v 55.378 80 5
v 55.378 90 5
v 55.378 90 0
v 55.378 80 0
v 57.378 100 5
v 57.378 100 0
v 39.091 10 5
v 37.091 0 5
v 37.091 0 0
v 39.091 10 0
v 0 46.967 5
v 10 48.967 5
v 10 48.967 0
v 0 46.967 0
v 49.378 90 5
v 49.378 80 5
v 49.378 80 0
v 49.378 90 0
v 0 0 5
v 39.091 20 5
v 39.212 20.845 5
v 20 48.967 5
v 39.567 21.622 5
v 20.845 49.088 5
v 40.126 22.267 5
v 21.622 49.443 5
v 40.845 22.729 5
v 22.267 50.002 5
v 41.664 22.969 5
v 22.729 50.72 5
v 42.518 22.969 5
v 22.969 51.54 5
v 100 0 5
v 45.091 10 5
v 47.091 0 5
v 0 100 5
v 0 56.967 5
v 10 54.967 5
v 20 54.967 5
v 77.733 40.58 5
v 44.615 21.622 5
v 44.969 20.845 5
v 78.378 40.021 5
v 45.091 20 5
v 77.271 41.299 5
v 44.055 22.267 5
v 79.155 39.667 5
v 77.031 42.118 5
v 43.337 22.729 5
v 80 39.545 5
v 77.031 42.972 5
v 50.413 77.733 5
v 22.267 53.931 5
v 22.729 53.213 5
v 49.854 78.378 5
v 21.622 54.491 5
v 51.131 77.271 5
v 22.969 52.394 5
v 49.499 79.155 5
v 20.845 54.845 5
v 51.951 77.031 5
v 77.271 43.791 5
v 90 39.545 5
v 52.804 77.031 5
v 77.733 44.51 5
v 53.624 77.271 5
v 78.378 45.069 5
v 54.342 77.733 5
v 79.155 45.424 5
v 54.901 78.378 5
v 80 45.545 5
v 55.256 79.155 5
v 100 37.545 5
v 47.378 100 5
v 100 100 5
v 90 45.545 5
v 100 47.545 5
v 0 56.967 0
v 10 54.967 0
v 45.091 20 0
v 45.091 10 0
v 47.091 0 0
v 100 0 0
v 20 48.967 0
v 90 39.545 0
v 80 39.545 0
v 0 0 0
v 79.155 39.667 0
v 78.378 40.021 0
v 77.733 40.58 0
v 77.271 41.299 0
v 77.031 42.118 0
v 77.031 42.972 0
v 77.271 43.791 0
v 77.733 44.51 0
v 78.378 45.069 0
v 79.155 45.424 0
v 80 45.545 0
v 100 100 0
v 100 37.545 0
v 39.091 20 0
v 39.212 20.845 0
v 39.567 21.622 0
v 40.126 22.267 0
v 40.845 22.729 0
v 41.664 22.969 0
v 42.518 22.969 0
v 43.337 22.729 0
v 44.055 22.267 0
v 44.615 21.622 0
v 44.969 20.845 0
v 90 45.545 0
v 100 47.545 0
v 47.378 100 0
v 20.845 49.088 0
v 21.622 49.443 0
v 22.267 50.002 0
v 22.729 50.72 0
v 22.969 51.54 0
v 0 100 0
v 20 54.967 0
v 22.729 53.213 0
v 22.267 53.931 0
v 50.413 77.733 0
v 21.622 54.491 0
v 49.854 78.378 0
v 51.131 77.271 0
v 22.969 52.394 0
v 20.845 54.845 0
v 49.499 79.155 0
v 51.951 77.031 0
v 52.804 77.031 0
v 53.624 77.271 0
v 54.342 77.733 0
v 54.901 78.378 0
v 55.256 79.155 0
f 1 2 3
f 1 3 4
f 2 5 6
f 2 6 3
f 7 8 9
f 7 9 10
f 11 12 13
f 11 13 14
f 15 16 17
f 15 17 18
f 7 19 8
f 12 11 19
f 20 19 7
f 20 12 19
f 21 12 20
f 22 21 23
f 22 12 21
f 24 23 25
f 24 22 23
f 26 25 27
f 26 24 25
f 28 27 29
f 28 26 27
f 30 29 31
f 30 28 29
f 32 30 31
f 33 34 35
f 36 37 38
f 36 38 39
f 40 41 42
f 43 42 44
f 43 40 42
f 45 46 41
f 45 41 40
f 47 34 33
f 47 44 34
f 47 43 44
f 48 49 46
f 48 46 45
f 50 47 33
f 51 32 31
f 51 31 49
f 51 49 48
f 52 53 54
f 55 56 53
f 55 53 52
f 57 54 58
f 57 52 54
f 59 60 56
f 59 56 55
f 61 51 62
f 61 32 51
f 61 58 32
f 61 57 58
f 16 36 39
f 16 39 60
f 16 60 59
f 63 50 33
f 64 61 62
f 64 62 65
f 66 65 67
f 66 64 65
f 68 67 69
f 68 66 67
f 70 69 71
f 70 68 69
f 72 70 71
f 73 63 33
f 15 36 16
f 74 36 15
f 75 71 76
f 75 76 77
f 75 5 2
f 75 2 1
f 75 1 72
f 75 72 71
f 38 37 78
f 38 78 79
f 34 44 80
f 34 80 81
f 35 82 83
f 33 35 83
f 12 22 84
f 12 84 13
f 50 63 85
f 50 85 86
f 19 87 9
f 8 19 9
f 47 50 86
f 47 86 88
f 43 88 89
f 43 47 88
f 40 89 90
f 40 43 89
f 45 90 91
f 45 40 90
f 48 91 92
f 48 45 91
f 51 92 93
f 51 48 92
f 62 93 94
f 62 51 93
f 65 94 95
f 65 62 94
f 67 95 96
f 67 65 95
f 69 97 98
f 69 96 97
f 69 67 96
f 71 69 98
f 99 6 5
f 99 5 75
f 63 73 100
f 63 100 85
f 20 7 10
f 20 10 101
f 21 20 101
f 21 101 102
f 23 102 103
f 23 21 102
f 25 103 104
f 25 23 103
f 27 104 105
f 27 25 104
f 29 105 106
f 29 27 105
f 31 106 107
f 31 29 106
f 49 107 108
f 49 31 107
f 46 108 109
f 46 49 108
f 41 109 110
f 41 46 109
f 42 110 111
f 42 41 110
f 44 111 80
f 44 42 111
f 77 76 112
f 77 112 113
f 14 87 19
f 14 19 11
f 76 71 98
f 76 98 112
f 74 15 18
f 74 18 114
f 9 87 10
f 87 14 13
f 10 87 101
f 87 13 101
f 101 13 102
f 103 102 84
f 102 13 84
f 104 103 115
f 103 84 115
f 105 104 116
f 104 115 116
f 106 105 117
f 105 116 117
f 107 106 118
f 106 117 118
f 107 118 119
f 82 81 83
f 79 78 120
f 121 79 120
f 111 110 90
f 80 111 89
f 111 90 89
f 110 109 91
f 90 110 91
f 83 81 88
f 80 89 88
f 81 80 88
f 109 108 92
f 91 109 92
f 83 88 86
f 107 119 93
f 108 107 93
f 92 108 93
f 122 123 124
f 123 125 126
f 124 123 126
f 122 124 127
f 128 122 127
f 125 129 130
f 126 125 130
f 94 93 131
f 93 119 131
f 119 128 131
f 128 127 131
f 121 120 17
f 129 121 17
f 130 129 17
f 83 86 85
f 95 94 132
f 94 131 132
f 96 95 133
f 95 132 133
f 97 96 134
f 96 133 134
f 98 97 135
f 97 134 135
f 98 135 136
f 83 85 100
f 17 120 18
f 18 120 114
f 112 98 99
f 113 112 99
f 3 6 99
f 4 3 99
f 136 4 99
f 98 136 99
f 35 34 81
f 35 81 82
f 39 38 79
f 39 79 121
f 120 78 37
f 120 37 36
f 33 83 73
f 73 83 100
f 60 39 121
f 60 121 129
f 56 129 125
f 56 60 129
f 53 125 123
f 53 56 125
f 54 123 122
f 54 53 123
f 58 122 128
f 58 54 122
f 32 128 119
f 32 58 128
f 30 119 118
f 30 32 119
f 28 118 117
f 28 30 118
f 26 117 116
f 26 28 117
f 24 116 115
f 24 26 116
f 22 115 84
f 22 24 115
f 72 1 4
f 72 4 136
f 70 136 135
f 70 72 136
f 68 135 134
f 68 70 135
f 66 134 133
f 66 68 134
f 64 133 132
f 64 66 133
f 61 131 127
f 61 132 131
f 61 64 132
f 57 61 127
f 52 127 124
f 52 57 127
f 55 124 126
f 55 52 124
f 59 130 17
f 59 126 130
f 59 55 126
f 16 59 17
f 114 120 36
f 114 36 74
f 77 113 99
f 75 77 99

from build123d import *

# Parameters (mm, degrees)
SKIZZE1_W                        = 100
SKIZZE1_H                        = 100
AUFSATZ_LINEAR_AUSTRAGEN1_DEPTH  = 5
SCHNITT_LINEAR_AUSTRAGEN1_REACH  = 7
SCHNITT_LINEAR_AUSTRAGEN14_REACH = 7
SCHNITT_LINEAR_AUSTRAGEN15_REACH = 7
SCHNITT_LINEAR_AUSTRAGEN16_REACH = 7


with BuildPart() as part:
    # Skizze1 → Aufsatz-Linear austragen1 (new body)
    with BuildSketch(Plane.XY):
        with Locations((50, 50)):
            Rectangle(SKIZZE1_W, SKIZZE1_H)
    extrude(amount=AUFSATZ_LINEAR_AUSTRAGEN1_DEPTH)

    # Skizze2 → Schnitt-Linear austragen1 (cut, up to next)
    with BuildSketch(Plane(origin=(61.541641428, 22.675716927, 5), x_dir=(1, 0, 0), z_dir=(0, 0, 1)), mode=Mode.PRIVATE) as schnitt_linear_austragen1_sk1:
        with BuildLine():
            Line((-24.45087326, -22.675716927), (-22.45087326, -12.675716927))
            Line((-22.45087326, -12.675716927), (-22.45087326, -2.675716927))
            ThreePointArc((-22.45087326, -2.675716927), (-19.45087326, 0.324283073), (-16.45087326, -2.675716927))
            Line((-16.45087326, -2.675716927), (-16.45087326, -12.675716927))
            Line((-16.45087326, -12.675716927), (-14.45087326, -22.675716927))
            Line((-14.45087326, -22.675716927), (-24.45087326, -22.675716927))
        make_face()
    schnitt_linear_austragen1_tool1 = extrude(schnitt_linear_austragen1_sk1.sketch, amount=-SCHNITT_LINEAR_AUSTRAGEN1_REACH, mode=Mode.PRIVATE) & part.part
    add(schnitt_linear_austragen1_tool1.solids().sort_by_distance((42.090768, 10.16893, 5))[0], mode=Mode.SUBTRACT)

    # Skizze24 → Schnitt-Linear austragen14 (cut, up to next)
    with BuildSketch(Plane(origin=(44.055881927, 74.466743066, 5), x_dir=(1, 0, 0), z_dir=(0, 0, 1)), mode=Mode.PRIVATE) as schnitt_linear_austragen14_sk1:
        with BuildLine():
            Line((-44.055881927, -17.5), (-34.055881927, -19.5))
            Line((-34.055881927, -19.5), (-24.055881927, -19.5))
            ThreePointArc((-24.055881927, -19.5), (-21.055881927, -22.5), (-24.055881927, -25.5))
            Line((-24.055881927, -25.5), (-34.055881927, -25.5))
            Line((-34.055881927, -25.5), (-44.055881927, -27.5))
            Line((-44.055881927, -27.5), (-44.055881927, -17.5))
        make_face()
    schnitt_linear_austragen14_tool1 = extrude(schnitt_linear_austragen14_sk1.sketch, amount=-SCHNITT_LINEAR_AUSTRAGEN14_REACH, mode=Mode.PRIVATE) & part.part
    add(schnitt_linear_austragen14_tool1.solids().sort_by_distance((10.16893, 51.966743, 5))[0], mode=Mode.SUBTRACT)

    # Skizze25 → Schnitt-Linear austragen15 (cut, up to next)
    with BuildSketch(Plane(origin=(81.625168415, 83.365494521, 5), x_dir=(1, 0, 0), z_dir=(0, 0, 1)), mode=Mode.PRIVATE) as schnitt_linear_austragen15_sk1:
        with BuildLine():
            Line((-24.247626507, 16.634505479), (-26.247626507, 6.634505479))
            Line((-26.247626507, 6.634505479), (-26.247626507, -3.365494521))
            ThreePointArc((-26.247626507, -3.365494521), (-29.247626507, -6.365494521), (-32.247626507, -3.365494521))
            Line((-32.247626507, -3.365494521), (-32.247626507, 6.634505479))
            Line((-32.247626507, 6.634505479), (-34.247626507, 16.634505479))
            Line((-34.247626507, 16.634505479), (-24.247626507, 16.634505479))
        make_face()
    schnitt_linear_austragen15_tool1 = extrude(schnitt_linear_austragen15_sk1.sketch, amount=-SCHNITT_LINEAR_AUSTRAGEN15_REACH, mode=Mode.PRIVATE) & part.part
    add(schnitt_linear_austragen15_tool1.solids().sort_by_distance((52.377542, 89.83107, 5))[0], mode=Mode.SUBTRACT)

    # Skizze26 → Schnitt-Linear austragen16 (cut, up to next)
    with BuildSketch(Plane(origin=(95.870397917, 55.045051389, 5), x_dir=(1, 0, 0), z_dir=(0, 0, 1)), mode=Mode.PRIVATE) as schnitt_linear_austragen16_sk1:
        with BuildLine():
            Line((4.129602083, -17.5), (-5.870397917, -15.5))
            Line((-5.870397917, -15.5), (-15.870397917, -15.5))
            ThreePointArc((-15.870397917, -15.5), (-18.870397917, -12.5), (-15.870397917, -9.5))
            Line((-15.870397917, -9.5), (-5.870397917, -9.5))
            Line((-5.870397917, -9.5), (4.129602083, -7.5))
            Line((4.129602083, -7.5), (4.129602083, -17.5))
        make_face()
    schnitt_linear_austragen16_tool1 = extrude(schnitt_linear_austragen16_sk1.sketch, amount=-SCHNITT_LINEAR_AUSTRAGEN16_REACH, mode=Mode.PRIVATE) & part.part
    add(schnitt_linear_austragen16_tool1.solids().sort_by_distance((89.83107, 42.545051, 5))[0], mode=Mode.SUBTRACT)


solid = part.part
